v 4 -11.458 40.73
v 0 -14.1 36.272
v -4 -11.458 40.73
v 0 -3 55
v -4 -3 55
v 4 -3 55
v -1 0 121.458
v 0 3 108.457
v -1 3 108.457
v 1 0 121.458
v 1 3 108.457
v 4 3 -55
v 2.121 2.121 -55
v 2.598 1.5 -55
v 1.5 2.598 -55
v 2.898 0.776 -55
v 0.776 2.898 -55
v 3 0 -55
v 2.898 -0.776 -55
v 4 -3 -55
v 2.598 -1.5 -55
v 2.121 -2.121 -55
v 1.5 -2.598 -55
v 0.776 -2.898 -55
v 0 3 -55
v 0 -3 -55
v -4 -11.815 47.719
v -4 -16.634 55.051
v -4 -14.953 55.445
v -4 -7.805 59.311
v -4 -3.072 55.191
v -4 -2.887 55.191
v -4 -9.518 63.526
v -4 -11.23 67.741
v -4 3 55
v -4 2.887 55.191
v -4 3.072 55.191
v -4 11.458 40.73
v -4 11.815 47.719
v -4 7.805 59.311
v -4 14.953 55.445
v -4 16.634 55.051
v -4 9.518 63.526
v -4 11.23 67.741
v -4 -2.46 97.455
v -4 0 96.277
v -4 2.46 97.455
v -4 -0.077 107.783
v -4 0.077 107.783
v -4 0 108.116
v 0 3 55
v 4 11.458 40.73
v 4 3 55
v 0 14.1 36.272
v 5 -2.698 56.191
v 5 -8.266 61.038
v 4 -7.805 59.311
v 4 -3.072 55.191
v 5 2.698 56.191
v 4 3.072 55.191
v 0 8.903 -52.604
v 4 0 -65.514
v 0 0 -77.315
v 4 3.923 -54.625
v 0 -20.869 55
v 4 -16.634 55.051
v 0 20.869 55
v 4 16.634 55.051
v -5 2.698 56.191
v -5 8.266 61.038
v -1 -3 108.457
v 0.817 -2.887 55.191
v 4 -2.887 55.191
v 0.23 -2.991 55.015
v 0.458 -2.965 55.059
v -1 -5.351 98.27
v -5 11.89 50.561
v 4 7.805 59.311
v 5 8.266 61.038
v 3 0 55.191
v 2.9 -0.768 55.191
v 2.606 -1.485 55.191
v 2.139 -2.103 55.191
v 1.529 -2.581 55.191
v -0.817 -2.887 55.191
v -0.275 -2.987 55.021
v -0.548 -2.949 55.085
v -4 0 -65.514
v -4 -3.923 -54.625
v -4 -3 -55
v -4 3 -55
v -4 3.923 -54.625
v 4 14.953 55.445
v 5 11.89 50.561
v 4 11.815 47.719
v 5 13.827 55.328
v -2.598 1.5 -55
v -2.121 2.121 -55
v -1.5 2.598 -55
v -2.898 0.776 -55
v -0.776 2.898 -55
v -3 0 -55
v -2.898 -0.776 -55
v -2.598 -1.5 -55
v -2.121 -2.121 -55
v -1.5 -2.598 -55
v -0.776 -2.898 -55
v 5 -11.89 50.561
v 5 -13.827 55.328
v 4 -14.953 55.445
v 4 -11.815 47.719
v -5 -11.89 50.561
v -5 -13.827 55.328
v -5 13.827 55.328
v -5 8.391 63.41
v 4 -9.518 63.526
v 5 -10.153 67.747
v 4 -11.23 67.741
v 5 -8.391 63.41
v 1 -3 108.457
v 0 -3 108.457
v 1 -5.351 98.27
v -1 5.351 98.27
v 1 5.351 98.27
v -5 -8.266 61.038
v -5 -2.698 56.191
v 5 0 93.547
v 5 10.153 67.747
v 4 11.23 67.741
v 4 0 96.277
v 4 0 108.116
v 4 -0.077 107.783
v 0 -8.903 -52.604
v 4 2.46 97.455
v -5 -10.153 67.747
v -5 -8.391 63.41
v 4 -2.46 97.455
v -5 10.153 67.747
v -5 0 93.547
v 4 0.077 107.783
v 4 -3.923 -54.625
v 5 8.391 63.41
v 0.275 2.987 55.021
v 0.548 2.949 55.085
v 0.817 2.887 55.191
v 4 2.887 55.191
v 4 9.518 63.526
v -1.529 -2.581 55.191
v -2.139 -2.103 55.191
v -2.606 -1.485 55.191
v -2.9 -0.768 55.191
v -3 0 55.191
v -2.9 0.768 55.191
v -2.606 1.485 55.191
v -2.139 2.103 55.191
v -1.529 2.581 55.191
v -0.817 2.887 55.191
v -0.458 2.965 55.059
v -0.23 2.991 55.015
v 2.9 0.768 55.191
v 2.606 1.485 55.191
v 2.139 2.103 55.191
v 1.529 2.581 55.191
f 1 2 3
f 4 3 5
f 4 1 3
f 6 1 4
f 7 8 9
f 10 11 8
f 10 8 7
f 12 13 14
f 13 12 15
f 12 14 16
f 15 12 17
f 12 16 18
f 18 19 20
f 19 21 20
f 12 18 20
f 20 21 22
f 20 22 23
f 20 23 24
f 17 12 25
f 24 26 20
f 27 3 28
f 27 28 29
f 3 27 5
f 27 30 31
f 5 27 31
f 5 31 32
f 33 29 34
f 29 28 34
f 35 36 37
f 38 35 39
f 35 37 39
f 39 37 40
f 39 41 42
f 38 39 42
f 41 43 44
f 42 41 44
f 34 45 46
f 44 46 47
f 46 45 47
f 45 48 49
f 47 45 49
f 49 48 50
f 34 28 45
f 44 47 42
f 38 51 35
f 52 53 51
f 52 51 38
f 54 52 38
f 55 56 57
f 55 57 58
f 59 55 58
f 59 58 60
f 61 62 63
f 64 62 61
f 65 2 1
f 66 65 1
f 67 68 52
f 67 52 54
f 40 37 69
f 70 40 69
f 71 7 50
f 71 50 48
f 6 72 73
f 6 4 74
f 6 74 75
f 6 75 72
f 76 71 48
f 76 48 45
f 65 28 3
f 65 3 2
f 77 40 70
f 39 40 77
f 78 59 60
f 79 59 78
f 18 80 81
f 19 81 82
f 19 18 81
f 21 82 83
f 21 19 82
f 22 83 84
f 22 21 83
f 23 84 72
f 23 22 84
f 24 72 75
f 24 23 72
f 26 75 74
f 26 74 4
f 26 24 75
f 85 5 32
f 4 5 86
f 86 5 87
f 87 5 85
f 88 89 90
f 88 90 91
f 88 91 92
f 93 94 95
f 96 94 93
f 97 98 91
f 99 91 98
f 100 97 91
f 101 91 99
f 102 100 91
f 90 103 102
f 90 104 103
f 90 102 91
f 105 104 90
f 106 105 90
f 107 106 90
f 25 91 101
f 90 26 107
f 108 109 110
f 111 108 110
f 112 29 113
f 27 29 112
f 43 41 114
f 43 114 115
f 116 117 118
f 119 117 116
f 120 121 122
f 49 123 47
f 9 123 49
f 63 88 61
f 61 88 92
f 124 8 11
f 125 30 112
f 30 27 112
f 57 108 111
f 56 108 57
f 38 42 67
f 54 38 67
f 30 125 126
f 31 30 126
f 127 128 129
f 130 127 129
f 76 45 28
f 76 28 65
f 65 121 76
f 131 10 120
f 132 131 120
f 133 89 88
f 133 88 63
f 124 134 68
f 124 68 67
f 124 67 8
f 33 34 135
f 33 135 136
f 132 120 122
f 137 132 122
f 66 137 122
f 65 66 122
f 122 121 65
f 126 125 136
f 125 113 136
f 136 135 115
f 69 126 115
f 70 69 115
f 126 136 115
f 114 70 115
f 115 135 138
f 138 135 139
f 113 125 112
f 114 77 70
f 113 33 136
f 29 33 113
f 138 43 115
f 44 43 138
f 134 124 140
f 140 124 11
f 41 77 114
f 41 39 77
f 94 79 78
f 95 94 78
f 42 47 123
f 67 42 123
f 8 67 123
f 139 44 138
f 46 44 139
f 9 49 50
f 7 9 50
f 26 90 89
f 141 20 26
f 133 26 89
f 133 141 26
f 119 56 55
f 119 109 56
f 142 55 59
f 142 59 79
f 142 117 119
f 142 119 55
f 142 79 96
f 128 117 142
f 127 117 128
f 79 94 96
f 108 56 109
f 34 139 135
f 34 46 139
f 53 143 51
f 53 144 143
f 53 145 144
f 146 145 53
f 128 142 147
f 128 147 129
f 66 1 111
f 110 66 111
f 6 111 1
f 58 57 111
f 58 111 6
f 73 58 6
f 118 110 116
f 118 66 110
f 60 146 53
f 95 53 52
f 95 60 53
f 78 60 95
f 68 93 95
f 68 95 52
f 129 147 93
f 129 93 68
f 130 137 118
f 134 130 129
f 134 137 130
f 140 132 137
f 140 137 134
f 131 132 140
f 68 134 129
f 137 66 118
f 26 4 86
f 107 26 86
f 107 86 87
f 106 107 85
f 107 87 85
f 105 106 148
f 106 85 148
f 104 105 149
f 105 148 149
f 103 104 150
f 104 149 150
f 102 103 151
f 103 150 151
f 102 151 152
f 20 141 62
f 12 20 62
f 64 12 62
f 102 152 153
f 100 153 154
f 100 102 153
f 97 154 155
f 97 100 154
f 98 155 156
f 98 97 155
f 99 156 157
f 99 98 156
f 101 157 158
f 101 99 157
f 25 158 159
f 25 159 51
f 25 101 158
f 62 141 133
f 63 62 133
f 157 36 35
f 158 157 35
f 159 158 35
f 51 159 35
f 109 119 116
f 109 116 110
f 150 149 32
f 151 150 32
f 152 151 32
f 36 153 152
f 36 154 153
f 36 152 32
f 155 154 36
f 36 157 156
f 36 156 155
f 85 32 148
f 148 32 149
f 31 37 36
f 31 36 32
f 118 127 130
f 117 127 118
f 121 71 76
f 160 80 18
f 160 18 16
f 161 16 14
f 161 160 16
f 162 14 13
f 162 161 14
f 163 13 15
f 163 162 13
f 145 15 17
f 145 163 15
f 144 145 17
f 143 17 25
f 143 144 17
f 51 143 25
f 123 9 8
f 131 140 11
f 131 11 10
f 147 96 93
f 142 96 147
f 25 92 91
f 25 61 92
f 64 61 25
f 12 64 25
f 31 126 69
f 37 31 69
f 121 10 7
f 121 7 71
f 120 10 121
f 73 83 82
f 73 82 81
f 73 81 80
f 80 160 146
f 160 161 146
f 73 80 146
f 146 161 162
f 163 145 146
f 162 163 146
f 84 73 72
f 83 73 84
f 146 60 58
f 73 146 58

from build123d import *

# Parameters (mm, degrees)
F1_DEPTH     = 3
F2_DEPTH     = 3
F4_DEPTH     = 4
F5_DEPTH     = 4
F6_T1_DEPTH  = 40.486982059
F6_T3_DEPTH  = 40.486982059
F6_T8_DEPTH  = 76.9380455506
F6_T13_DEPTH = 76.9380455506
F6_T18_DEPTH = 76.9380455506
F6_T23_DEPTH = 76.9380455506
F6_T28_DEPTH = 26.5734639037
F6_T35_DEPTH = 26.5734639037
F7_SIZE      = 3
F8_T4_DEPTH  = 125
F8_T10_DEPTH = 125
F8_T16_DEPTH = 125
F8_T22_DEPTH = 125
F9_DEPTH     = 5
F10_DEPTH    = 5
F11_SIZE     = 0.99999
F12_DEPTH    = 4
F13_DEPTH    = 4
F14_SIZE     = 3.99999


# Not quite as in the source:
# - a fillet or chamfer that OpenCascade refuses, or shapes differently, is made with other operations: its cross-section is extruded or revolved along the edge and cut away or added
# - a fillet or chamfer is up to 0.001 mm smaller than in the source, because OpenCascade refuses the exact size


with BuildPart() as f1:
    # F0 (on Right) → F1 (new body)
    with BuildSketch(Plane.YZ):
        Polygon((-3, 55), (-3, 0), (-3, -55), (3, -55), (3, 0), (3, 55), align=None)
    extrude(amount=F1_DEPTH)

    # F0 (on Right) → F2 (join)
    with BuildSketch(Plane.YZ):
        Polygon((-3, 55), (-3, 0), (-3, -55), (3, -55), (3, 0), (3, 55), align=None)
    extrude(amount=-F2_DEPTH)

    # F0 (on Right) → F4 (join)
    with BuildSketch(Plane.YZ):
        Polygon((-14.1003550962, 36.2719446421), (-3, 55), (3, 55), (14.1003550962, 36.2719446421), (20.8685267717, 55), (3, 108.4572896361), (0, 121.4577183127), (-3, 108.4572896361), (-20.8685267717, 55), align=None)
    extrude(amount=F4_DEPTH)

    # F3 (on face) + F0 (on Right) → F5 (join)
    with BuildSketch(Plane.YZ):
        Polygon((-7.805341389, 59.3111515045), (-3.0717977788, 55.1912151277), (3.0717977788, 55.1912151277), (7.805341389, 59.3111515045), (9.517685743, 63.5261535645), (11.2300300971, 67.7411556244), (0, 96.2772667408), (-11.2300300971, 67.7411556244), (-9.517685743, 63.5261535645), align=None)
        Polygon((9.517685743, 63.5261535645), (7.805341389, 59.3111515045), (11.814879576, 47.7191654262), (14.9534028023, 55.4447621107), align=None)
    with BuildSketch(Plane.YZ):
        Polygon((-14.1003550962, 36.2719446421), (-3, 55), (3, 55), (14.1003550962, 36.2719446421), (20.8685267717, 55), (3, 108.4572896361), (0, 121.4577183127), (-3, 108.4572896361), (-20.8685267717, 55), align=None)
    extrude(amount=-F5_DEPTH)

    # F6: chamfer of 4 on 10 edges, made by hand

    # F6_s2 → F6_t1 (cut)
    with BuildSketch(Plane(origin=(0, -23.4873916457, 64.9914322573), x_dir=(1, 0, 0), z_dir=(0, 0.3398782487, -0.9404694445))):
        Polygon((0, 0.932908104), (4, -3.067091896), (4, 0.932908104), align=None)
        Polygon((-4, -3.067091896), (0, 0.932908104), (-4, 0.932908104), align=None)
    extrude(amount=F6_T1_DEPTH, mode=Mode.SUBTRACT)

    # F6_s4 → F6_t3 (cut)
    with BuildSketch(Plane(origin=(0, 9.7267470895, 26.9146627299), x_dir=(1, 0, 0), z_dir=(0, 0.3398782487, 0.9404694445))):
        Polygon((4, -3.067091896), (0, 0.932908104), (4, 0.932908104), align=None)
        Polygon((-4, -3.067091896), (0, 0.932908104), (-4, 0.932908104), align=None)
    extrude(amount=F6_T3_DEPTH, mode=Mode.SUBTRACT)


with BuildPart() as f6_tool6:
    # F6_s7 → F6_t8 (new body)
    with BuildSketch(Plane(origin=(0, -11.1782341891, 33.4419345425), x_dir=(1, 0, 0), z_dir=(0, -0.3170169324, 0.9484198778))):
        Polygon((4, 33.2280568939), (0, 37.2280568939), (4, 37.2280568939), align=None)
    extrude(amount=F6_T8_DEPTH)

    split(bisect_by=Plane(origin=(0, 26.6107337931, 6.1407360761), x_dir=(1, 0, 0), z_dir=(0, 0.9743928202, 0.224852467)), keep=Keep.TOP)


with BuildPart() as f1_1:
    add(f1.part)

    # F6_t5: cut F6_tool6
    add(f6_tool6.part, mode=Mode.SUBTRACT)


with BuildPart() as f6_tool11:
    # F6_s12 → F6_t13 (new body)
    with BuildSketch(Plane(origin=(0, 35.5688973771, 106.4115062996), x_dir=(1, 0, 0), z_dir=(0, -0.3170169324, -0.9484198778))):
        Polygon((4, 33.2280568939), (0, 37.2280568939), (4, 37.2280568939), align=None)
    extrude(amount=F6_T13_DEPTH)

    split(bisect_by=Plane(origin=(0, -26.6107337931, 6.1407360761), x_dir=(1, 0, 0), z_dir=(0, -0.9743928202, 0.224852467)), keep=Keep.TOP)


with BuildPart() as f1_2:
    add(f1_1.part)

    # F6_t10: cut F6_tool11
    add(f6_tool11.part, mode=Mode.SUBTRACT)


with BuildPart() as f6_tool16:
    # F6_s17 → F6_t18 (new body)
    with BuildSketch(Plane(origin=(0, 35.5688973771, 106.4115062996), x_dir=(1, 0, 0), z_dir=(0, -0.3170169324, -0.9484198778))):
        Polygon((-4, 33.2280568939), (0, 37.2280568939), (-4, 37.2280568939), align=None)
    extrude(amount=F6_T18_DEPTH)

    split(bisect_by=Plane(origin=(0, -26.6107337931, 6.1407360761), x_dir=(1, 0, 0), z_dir=(0, -0.9743928202, 0.224852467)), keep=Keep.TOP)


with BuildPart() as f1_3:
    add(f1_2.part)

    # F6_t15: cut F6_tool16
    add(f6_tool16.part, mode=Mode.SUBTRACT)


with BuildPart() as f6_tool21:
    # F6_s22 → F6_t23 (new body)
    with BuildSketch(Plane(origin=(0, -11.1782341891, 33.4419345425), x_dir=(1, 0, 0), z_dir=(0, -0.3170169324, 0.9484198778))):
        Polygon((-4, 33.2280568939), (0, 37.2280568939), (-4, 37.2280568939), align=None)
    extrude(amount=F6_T23_DEPTH)

    split(bisect_by=Plane(origin=(0, 26.6107337931, 6.1407360761), x_dir=(1, 0, 0), z_dir=(0, 0.9743928202, 0.224852467)), keep=Keep.TOP)


with BuildPart() as f1_4:
    add(f1_3.part)

    # F6_t20: cut F6_tool21
    add(f6_tool21.part, mode=Mode.SUBTRACT)


with BuildPart() as f6_tool26:
    # F6_s27 → F6_t28 (new body)
    with BuildSketch(Plane.XZ.offset(13.2867319519)):
        Polygon((0, 55), (-4, 59), (-4, 55), align=None)
    extrude(amount=-F6_T28_DEPTH)

    split(bisect_by=Plane.YZ.offset(-3), keep=Keep.BOTTOM)

    split(bisect_by=Plane(origin=(0, 26.3442442024, 15.6145664778), x_dir=(1, 0, 0), z_dir=(0, -0.8602462388, -0.5098788176)), keep=Keep.TOP)

    split(bisect_by=Plane(origin=(0, -26.3442442024, 15.6145664778), x_dir=(1, 0, 0), z_dir=(0, 0.8602462388, -0.5098788176)), keep=Keep.TOP)


with BuildPart() as f1_5:
    add(f1_4.part)

    # F6_t25: cut F6_tool26
    add(f6_tool26.part, mode=Mode.SUBTRACT)


with BuildPart() as f6_tool33:
    # F6_s34 → F6_t35 (new body)
    with BuildSketch(Plane.XZ.offset(13.2867319519)):
        Polygon((4, 59), (0, 55), (4, 55), align=None)
    extrude(amount=-F6_T35_DEPTH)

    split(bisect_by=Plane.YZ.offset(3), keep=Keep.TOP)

    split(bisect_by=Plane(origin=(0, 26.3442442024, 15.6145664778), x_dir=(1, 0, 0), z_dir=(0, -0.8602462388, -0.5098788176)), keep=Keep.TOP)

    split(bisect_by=Plane(origin=(0, -26.3442442024, 15.6145664778), x_dir=(1, 0, 0), z_dir=(0, 0.8602462388, -0.5098788176)), keep=Keep.TOP)


with BuildPart() as f1_6:
    add(f1_5.part)

    # F6_t32: cut F6_tool33
    add(f6_tool33.part, mode=Mode.SUBTRACT)

    # F7
    f7_edges = [f1_6.edges().sort_by_distance(p)[0] for p in [
        (4, 6.201839, 94.582196),
        (4, -6.201839, 94.582196),
        (-4, -6.201839, 94.582196),
        (-4, 6.201839, 94.582196),
    ]]
    chamfer(f7_edges, length=F7_SIZE)

    # F8: fillet of radius 3 on 4 edges, made by hand


with BuildPart() as f8_tool2:
    # F8_s3 → F8_t4 (new body)
    with BuildSketch(Plane.XY.offset(62.5)):
        with BuildLine():
            ThreePointArc((0, -3), (-2.1213203436, -2.1213203436), (-3, 0))
            Line((-3, 0), (-3, -3))
            Line((-3, -3), (0, -3))
        make_face()
    extrude(amount=-F8_T4_DEPTH)

    split(bisect_by=Plane(origin=(0, -26.3442442024, 15.6145664778), x_dir=(1, 0, 0), z_dir=(0, 0.8602462388, -0.5098788176)), keep=Keep.TOP)

    split(bisect_by=Plane(origin=(27.5, 0, 27.5), x_dir=(0, 1, 0), z_dir=(-0.7071067812, 0, -0.7071067812)), keep=Keep.TOP)


with BuildPart() as f1_7:
    add(f1_6.part)

    # F8_t1: cut F8_tool2
    add(f8_tool2.part, mode=Mode.SUBTRACT)


with BuildPart() as f8_tool8:
    # F8_s9 → F8_t10 (new body)
    with BuildSketch(Plane.XY.offset(-62.5)):
        with BuildLine():
            ThreePointArc((-3, 0), (-2.1213203436, 2.1213203436), (0, 3))
            Line((0, 3), (-3, 3))
            Line((-3, 3), (-3, 0))
        make_face()
    extrude(amount=F8_T10_DEPTH)

    split(bisect_by=Plane(origin=(27.5, 0, 27.5), x_dir=(0, 1, 0), z_dir=(-0.7071067812, 0, -0.7071067812)), keep=Keep.TOP)

    split(bisect_by=Plane(origin=(0, 26.3442442024, 15.6145664778), x_dir=(1, 0, 0), z_dir=(0, -0.8602462388, -0.5098788176)), keep=Keep.TOP)


with BuildPart() as f1_8:
    add(f1_7.part)

    # F8_t7: cut F8_tool8
    add(f8_tool8.part, mode=Mode.SUBTRACT)


with BuildPart() as f8_tool14:
    # F8_s15 → F8_t16 (new body)
    with BuildSketch(Plane.XY.offset(62.5)):
        with BuildLine():
            ThreePointArc((3, 0), (2.1213203436, 2.1213203436), (0, 3))
            Line((0, 3), (3, 3))
            Line((3, 3), (3, 0))
        make_face()
    extrude(amount=-F8_T16_DEPTH)

    split(bisect_by=Plane(origin=(0, 26.3442442024, 15.6145664778), x_dir=(1, 0, 0), z_dir=(0, -0.8602462388, -0.5098788176)), keep=Keep.TOP)

    split(bisect_by=Plane(origin=(-27.5, 0, 27.5), x_dir=(0, 1, 0), z_dir=(0.7071067812, 0, -0.7071067812)), keep=Keep.TOP)


with BuildPart() as f1_9:
    add(f1_8.part)

    # F8_t13: cut F8_tool14
    add(f8_tool14.part, mode=Mode.SUBTRACT)


with BuildPart() as f8_tool20:
    # F8_s21 → F8_t22 (new body)
    with BuildSketch(Plane.XY.offset(-62.5)):
        with BuildLine():
            ThreePointArc((3, 0), (2.1213203436, -2.1213203436), (0, -3))
            Line((0, -3), (3, -3))
            Line((3, -3), (3, 0))
        make_face()
    extrude(amount=F8_T22_DEPTH)

    split(bisect_by=Plane(origin=(0, -26.3442442024, 15.6145664778), x_dir=(1, 0, 0), z_dir=(0, 0.8602462388, -0.5098788176)), keep=Keep.TOP)

    split(bisect_by=Plane(origin=(-27.5, 0, 27.5), x_dir=(0, 1, 0), z_dir=(0.7071067812, 0, -0.7071067812)), keep=Keep.TOP)


with BuildPart() as f1_10:
    add(f1_9.part)

    # F8_t19: cut F8_tool20
    add(f8_tool20.part, mode=Mode.SUBTRACT)

    # F3 (on face) → F9 (join)
    with BuildSketch(Plane.YZ):
        Polygon((-7.805341389, 59.3111515045), (-3.0717977788, 55.1912151277), (3.0717977788, 55.1912151277), (7.805341389, 59.3111515045), (9.517685743, 63.5261535645), (11.2300300971, 67.7411556244), (0, 96.2772667408), (-11.2300300971, 67.7411556244), (-9.517685743, 63.5261535645), align=None)
        Polygon((-11.814879576, 47.7191654262), (-7.805341389, 59.3111515045), (-9.517685743, 63.5261535645), (-14.9534028023, 55.4447621107), align=None)
        Polygon((9.517685743, 63.5261535645), (7.805341389, 59.3111515045), (11.814879576, 47.7191654262), (14.9534028023, 55.4447621107), align=None)
    extrude(amount=F9_DEPTH)

    # F3 (on face) → F10 (join)
    with BuildSketch(Plane.YZ):
        Polygon((-7.805341389, 59.3111515045), (-3.0717977788, 55.1912151277), (3.0717977788, 55.1912151277), (7.805341389, 59.3111515045), (9.517685743, 63.5261535645), (11.2300300971, 67.7411556244), (0, 96.2772667408), (-11.2300300971, 67.7411556244), (-9.517685743, 63.5261535645), align=None)
        Polygon((-11.814879576, 47.7191654262), (-7.805341389, 59.3111515045), (-9.517685743, 63.5261535645), (-14.9534028023, 55.4447621107), align=None)
        Polygon((9.517685743, 63.5261535645), (7.805341389, 59.3111515045), (11.814879576, 47.7191654262), (14.9534028023, 55.4447621107), align=None)
    extrude(amount=-F10_DEPTH)

    # F11 (size 1 in the source; OpenCascade refuses exactly that, so slightly less here)
    f11_edges = [f1_10.edges().sort_by_distance(p)[0] for p in [
        (5, -5.43857, 57.251183),
        (5, 0, 55.191215),
        (5, 5.43857, 57.251183),
        (5, 9.81011, 53.515158),
        (5, 13.384141, 51.581964),
        (5, 12.235544, 59.485458),
        (5, 10.373858, 65.633655),
        (5, 5.615015, 82.009211),
        (5, -5.615015, 82.009211),
        (5, -10.373858, 65.633655),
        (5, -12.235544, 59.485458),
        (5, -13.384141, 51.581964),
        (5, -9.81011, 53.515158),
        (-5, -5.615015, 82.009211),
        (-5, -5.43857, 57.251183),
        (-5, 0, 55.191215),
        (-5, 5.43857, 57.251183),
        (-5, 9.81011, 53.515158),
        (-5, 13.384141, 51.581964),
        (-5, 12.235544, 59.485458),
        (-5, 10.373858, 65.633655),
        (-5, 5.615015, 82.009211),
        (-5, -10.373858, 65.633655),
        (-5, -12.235544, 59.485458),
        (-5, -13.384141, 51.581964),
        (-5, -9.81011, 53.515158),
    ]]
    chamfer(f11_edges, length=F11_SIZE)

    # F0 (on Right) → F12 (join)
    with BuildSketch(Plane.YZ):
        Polygon((3, -55), (-3, -55), (-8.9030144736, -52.6038594544), (0, -77.3145779967), (8.9030144736, -52.6038594544), align=None)
    extrude(amount=F12_DEPTH)

    # F0 (on Right) → F13 (join)
    with BuildSketch(Plane.YZ):
        Polygon((3, -55), (-3, -55), (-8.9030144736, -52.6038594544), (0, -77.3145779967), (8.9030144736, -52.6038594544), align=None)
    extrude(amount=-F13_DEPTH)

    # F14 (size 4 in the source; OpenCascade refuses exactly that, so slightly less here)
    f14_edges = [f1_10.edges().sort_by_distance(p)[0] for p in [
        (-4, -4.451507, -64.959219),
        (-4, 4.451507, -64.959219),
        (4, -4.451507, -64.959219),
        (4, 4.451507, -64.959219),
    ]]
    chamfer(f14_edges, length=F14_SIZE)


solid = f1_10.part
